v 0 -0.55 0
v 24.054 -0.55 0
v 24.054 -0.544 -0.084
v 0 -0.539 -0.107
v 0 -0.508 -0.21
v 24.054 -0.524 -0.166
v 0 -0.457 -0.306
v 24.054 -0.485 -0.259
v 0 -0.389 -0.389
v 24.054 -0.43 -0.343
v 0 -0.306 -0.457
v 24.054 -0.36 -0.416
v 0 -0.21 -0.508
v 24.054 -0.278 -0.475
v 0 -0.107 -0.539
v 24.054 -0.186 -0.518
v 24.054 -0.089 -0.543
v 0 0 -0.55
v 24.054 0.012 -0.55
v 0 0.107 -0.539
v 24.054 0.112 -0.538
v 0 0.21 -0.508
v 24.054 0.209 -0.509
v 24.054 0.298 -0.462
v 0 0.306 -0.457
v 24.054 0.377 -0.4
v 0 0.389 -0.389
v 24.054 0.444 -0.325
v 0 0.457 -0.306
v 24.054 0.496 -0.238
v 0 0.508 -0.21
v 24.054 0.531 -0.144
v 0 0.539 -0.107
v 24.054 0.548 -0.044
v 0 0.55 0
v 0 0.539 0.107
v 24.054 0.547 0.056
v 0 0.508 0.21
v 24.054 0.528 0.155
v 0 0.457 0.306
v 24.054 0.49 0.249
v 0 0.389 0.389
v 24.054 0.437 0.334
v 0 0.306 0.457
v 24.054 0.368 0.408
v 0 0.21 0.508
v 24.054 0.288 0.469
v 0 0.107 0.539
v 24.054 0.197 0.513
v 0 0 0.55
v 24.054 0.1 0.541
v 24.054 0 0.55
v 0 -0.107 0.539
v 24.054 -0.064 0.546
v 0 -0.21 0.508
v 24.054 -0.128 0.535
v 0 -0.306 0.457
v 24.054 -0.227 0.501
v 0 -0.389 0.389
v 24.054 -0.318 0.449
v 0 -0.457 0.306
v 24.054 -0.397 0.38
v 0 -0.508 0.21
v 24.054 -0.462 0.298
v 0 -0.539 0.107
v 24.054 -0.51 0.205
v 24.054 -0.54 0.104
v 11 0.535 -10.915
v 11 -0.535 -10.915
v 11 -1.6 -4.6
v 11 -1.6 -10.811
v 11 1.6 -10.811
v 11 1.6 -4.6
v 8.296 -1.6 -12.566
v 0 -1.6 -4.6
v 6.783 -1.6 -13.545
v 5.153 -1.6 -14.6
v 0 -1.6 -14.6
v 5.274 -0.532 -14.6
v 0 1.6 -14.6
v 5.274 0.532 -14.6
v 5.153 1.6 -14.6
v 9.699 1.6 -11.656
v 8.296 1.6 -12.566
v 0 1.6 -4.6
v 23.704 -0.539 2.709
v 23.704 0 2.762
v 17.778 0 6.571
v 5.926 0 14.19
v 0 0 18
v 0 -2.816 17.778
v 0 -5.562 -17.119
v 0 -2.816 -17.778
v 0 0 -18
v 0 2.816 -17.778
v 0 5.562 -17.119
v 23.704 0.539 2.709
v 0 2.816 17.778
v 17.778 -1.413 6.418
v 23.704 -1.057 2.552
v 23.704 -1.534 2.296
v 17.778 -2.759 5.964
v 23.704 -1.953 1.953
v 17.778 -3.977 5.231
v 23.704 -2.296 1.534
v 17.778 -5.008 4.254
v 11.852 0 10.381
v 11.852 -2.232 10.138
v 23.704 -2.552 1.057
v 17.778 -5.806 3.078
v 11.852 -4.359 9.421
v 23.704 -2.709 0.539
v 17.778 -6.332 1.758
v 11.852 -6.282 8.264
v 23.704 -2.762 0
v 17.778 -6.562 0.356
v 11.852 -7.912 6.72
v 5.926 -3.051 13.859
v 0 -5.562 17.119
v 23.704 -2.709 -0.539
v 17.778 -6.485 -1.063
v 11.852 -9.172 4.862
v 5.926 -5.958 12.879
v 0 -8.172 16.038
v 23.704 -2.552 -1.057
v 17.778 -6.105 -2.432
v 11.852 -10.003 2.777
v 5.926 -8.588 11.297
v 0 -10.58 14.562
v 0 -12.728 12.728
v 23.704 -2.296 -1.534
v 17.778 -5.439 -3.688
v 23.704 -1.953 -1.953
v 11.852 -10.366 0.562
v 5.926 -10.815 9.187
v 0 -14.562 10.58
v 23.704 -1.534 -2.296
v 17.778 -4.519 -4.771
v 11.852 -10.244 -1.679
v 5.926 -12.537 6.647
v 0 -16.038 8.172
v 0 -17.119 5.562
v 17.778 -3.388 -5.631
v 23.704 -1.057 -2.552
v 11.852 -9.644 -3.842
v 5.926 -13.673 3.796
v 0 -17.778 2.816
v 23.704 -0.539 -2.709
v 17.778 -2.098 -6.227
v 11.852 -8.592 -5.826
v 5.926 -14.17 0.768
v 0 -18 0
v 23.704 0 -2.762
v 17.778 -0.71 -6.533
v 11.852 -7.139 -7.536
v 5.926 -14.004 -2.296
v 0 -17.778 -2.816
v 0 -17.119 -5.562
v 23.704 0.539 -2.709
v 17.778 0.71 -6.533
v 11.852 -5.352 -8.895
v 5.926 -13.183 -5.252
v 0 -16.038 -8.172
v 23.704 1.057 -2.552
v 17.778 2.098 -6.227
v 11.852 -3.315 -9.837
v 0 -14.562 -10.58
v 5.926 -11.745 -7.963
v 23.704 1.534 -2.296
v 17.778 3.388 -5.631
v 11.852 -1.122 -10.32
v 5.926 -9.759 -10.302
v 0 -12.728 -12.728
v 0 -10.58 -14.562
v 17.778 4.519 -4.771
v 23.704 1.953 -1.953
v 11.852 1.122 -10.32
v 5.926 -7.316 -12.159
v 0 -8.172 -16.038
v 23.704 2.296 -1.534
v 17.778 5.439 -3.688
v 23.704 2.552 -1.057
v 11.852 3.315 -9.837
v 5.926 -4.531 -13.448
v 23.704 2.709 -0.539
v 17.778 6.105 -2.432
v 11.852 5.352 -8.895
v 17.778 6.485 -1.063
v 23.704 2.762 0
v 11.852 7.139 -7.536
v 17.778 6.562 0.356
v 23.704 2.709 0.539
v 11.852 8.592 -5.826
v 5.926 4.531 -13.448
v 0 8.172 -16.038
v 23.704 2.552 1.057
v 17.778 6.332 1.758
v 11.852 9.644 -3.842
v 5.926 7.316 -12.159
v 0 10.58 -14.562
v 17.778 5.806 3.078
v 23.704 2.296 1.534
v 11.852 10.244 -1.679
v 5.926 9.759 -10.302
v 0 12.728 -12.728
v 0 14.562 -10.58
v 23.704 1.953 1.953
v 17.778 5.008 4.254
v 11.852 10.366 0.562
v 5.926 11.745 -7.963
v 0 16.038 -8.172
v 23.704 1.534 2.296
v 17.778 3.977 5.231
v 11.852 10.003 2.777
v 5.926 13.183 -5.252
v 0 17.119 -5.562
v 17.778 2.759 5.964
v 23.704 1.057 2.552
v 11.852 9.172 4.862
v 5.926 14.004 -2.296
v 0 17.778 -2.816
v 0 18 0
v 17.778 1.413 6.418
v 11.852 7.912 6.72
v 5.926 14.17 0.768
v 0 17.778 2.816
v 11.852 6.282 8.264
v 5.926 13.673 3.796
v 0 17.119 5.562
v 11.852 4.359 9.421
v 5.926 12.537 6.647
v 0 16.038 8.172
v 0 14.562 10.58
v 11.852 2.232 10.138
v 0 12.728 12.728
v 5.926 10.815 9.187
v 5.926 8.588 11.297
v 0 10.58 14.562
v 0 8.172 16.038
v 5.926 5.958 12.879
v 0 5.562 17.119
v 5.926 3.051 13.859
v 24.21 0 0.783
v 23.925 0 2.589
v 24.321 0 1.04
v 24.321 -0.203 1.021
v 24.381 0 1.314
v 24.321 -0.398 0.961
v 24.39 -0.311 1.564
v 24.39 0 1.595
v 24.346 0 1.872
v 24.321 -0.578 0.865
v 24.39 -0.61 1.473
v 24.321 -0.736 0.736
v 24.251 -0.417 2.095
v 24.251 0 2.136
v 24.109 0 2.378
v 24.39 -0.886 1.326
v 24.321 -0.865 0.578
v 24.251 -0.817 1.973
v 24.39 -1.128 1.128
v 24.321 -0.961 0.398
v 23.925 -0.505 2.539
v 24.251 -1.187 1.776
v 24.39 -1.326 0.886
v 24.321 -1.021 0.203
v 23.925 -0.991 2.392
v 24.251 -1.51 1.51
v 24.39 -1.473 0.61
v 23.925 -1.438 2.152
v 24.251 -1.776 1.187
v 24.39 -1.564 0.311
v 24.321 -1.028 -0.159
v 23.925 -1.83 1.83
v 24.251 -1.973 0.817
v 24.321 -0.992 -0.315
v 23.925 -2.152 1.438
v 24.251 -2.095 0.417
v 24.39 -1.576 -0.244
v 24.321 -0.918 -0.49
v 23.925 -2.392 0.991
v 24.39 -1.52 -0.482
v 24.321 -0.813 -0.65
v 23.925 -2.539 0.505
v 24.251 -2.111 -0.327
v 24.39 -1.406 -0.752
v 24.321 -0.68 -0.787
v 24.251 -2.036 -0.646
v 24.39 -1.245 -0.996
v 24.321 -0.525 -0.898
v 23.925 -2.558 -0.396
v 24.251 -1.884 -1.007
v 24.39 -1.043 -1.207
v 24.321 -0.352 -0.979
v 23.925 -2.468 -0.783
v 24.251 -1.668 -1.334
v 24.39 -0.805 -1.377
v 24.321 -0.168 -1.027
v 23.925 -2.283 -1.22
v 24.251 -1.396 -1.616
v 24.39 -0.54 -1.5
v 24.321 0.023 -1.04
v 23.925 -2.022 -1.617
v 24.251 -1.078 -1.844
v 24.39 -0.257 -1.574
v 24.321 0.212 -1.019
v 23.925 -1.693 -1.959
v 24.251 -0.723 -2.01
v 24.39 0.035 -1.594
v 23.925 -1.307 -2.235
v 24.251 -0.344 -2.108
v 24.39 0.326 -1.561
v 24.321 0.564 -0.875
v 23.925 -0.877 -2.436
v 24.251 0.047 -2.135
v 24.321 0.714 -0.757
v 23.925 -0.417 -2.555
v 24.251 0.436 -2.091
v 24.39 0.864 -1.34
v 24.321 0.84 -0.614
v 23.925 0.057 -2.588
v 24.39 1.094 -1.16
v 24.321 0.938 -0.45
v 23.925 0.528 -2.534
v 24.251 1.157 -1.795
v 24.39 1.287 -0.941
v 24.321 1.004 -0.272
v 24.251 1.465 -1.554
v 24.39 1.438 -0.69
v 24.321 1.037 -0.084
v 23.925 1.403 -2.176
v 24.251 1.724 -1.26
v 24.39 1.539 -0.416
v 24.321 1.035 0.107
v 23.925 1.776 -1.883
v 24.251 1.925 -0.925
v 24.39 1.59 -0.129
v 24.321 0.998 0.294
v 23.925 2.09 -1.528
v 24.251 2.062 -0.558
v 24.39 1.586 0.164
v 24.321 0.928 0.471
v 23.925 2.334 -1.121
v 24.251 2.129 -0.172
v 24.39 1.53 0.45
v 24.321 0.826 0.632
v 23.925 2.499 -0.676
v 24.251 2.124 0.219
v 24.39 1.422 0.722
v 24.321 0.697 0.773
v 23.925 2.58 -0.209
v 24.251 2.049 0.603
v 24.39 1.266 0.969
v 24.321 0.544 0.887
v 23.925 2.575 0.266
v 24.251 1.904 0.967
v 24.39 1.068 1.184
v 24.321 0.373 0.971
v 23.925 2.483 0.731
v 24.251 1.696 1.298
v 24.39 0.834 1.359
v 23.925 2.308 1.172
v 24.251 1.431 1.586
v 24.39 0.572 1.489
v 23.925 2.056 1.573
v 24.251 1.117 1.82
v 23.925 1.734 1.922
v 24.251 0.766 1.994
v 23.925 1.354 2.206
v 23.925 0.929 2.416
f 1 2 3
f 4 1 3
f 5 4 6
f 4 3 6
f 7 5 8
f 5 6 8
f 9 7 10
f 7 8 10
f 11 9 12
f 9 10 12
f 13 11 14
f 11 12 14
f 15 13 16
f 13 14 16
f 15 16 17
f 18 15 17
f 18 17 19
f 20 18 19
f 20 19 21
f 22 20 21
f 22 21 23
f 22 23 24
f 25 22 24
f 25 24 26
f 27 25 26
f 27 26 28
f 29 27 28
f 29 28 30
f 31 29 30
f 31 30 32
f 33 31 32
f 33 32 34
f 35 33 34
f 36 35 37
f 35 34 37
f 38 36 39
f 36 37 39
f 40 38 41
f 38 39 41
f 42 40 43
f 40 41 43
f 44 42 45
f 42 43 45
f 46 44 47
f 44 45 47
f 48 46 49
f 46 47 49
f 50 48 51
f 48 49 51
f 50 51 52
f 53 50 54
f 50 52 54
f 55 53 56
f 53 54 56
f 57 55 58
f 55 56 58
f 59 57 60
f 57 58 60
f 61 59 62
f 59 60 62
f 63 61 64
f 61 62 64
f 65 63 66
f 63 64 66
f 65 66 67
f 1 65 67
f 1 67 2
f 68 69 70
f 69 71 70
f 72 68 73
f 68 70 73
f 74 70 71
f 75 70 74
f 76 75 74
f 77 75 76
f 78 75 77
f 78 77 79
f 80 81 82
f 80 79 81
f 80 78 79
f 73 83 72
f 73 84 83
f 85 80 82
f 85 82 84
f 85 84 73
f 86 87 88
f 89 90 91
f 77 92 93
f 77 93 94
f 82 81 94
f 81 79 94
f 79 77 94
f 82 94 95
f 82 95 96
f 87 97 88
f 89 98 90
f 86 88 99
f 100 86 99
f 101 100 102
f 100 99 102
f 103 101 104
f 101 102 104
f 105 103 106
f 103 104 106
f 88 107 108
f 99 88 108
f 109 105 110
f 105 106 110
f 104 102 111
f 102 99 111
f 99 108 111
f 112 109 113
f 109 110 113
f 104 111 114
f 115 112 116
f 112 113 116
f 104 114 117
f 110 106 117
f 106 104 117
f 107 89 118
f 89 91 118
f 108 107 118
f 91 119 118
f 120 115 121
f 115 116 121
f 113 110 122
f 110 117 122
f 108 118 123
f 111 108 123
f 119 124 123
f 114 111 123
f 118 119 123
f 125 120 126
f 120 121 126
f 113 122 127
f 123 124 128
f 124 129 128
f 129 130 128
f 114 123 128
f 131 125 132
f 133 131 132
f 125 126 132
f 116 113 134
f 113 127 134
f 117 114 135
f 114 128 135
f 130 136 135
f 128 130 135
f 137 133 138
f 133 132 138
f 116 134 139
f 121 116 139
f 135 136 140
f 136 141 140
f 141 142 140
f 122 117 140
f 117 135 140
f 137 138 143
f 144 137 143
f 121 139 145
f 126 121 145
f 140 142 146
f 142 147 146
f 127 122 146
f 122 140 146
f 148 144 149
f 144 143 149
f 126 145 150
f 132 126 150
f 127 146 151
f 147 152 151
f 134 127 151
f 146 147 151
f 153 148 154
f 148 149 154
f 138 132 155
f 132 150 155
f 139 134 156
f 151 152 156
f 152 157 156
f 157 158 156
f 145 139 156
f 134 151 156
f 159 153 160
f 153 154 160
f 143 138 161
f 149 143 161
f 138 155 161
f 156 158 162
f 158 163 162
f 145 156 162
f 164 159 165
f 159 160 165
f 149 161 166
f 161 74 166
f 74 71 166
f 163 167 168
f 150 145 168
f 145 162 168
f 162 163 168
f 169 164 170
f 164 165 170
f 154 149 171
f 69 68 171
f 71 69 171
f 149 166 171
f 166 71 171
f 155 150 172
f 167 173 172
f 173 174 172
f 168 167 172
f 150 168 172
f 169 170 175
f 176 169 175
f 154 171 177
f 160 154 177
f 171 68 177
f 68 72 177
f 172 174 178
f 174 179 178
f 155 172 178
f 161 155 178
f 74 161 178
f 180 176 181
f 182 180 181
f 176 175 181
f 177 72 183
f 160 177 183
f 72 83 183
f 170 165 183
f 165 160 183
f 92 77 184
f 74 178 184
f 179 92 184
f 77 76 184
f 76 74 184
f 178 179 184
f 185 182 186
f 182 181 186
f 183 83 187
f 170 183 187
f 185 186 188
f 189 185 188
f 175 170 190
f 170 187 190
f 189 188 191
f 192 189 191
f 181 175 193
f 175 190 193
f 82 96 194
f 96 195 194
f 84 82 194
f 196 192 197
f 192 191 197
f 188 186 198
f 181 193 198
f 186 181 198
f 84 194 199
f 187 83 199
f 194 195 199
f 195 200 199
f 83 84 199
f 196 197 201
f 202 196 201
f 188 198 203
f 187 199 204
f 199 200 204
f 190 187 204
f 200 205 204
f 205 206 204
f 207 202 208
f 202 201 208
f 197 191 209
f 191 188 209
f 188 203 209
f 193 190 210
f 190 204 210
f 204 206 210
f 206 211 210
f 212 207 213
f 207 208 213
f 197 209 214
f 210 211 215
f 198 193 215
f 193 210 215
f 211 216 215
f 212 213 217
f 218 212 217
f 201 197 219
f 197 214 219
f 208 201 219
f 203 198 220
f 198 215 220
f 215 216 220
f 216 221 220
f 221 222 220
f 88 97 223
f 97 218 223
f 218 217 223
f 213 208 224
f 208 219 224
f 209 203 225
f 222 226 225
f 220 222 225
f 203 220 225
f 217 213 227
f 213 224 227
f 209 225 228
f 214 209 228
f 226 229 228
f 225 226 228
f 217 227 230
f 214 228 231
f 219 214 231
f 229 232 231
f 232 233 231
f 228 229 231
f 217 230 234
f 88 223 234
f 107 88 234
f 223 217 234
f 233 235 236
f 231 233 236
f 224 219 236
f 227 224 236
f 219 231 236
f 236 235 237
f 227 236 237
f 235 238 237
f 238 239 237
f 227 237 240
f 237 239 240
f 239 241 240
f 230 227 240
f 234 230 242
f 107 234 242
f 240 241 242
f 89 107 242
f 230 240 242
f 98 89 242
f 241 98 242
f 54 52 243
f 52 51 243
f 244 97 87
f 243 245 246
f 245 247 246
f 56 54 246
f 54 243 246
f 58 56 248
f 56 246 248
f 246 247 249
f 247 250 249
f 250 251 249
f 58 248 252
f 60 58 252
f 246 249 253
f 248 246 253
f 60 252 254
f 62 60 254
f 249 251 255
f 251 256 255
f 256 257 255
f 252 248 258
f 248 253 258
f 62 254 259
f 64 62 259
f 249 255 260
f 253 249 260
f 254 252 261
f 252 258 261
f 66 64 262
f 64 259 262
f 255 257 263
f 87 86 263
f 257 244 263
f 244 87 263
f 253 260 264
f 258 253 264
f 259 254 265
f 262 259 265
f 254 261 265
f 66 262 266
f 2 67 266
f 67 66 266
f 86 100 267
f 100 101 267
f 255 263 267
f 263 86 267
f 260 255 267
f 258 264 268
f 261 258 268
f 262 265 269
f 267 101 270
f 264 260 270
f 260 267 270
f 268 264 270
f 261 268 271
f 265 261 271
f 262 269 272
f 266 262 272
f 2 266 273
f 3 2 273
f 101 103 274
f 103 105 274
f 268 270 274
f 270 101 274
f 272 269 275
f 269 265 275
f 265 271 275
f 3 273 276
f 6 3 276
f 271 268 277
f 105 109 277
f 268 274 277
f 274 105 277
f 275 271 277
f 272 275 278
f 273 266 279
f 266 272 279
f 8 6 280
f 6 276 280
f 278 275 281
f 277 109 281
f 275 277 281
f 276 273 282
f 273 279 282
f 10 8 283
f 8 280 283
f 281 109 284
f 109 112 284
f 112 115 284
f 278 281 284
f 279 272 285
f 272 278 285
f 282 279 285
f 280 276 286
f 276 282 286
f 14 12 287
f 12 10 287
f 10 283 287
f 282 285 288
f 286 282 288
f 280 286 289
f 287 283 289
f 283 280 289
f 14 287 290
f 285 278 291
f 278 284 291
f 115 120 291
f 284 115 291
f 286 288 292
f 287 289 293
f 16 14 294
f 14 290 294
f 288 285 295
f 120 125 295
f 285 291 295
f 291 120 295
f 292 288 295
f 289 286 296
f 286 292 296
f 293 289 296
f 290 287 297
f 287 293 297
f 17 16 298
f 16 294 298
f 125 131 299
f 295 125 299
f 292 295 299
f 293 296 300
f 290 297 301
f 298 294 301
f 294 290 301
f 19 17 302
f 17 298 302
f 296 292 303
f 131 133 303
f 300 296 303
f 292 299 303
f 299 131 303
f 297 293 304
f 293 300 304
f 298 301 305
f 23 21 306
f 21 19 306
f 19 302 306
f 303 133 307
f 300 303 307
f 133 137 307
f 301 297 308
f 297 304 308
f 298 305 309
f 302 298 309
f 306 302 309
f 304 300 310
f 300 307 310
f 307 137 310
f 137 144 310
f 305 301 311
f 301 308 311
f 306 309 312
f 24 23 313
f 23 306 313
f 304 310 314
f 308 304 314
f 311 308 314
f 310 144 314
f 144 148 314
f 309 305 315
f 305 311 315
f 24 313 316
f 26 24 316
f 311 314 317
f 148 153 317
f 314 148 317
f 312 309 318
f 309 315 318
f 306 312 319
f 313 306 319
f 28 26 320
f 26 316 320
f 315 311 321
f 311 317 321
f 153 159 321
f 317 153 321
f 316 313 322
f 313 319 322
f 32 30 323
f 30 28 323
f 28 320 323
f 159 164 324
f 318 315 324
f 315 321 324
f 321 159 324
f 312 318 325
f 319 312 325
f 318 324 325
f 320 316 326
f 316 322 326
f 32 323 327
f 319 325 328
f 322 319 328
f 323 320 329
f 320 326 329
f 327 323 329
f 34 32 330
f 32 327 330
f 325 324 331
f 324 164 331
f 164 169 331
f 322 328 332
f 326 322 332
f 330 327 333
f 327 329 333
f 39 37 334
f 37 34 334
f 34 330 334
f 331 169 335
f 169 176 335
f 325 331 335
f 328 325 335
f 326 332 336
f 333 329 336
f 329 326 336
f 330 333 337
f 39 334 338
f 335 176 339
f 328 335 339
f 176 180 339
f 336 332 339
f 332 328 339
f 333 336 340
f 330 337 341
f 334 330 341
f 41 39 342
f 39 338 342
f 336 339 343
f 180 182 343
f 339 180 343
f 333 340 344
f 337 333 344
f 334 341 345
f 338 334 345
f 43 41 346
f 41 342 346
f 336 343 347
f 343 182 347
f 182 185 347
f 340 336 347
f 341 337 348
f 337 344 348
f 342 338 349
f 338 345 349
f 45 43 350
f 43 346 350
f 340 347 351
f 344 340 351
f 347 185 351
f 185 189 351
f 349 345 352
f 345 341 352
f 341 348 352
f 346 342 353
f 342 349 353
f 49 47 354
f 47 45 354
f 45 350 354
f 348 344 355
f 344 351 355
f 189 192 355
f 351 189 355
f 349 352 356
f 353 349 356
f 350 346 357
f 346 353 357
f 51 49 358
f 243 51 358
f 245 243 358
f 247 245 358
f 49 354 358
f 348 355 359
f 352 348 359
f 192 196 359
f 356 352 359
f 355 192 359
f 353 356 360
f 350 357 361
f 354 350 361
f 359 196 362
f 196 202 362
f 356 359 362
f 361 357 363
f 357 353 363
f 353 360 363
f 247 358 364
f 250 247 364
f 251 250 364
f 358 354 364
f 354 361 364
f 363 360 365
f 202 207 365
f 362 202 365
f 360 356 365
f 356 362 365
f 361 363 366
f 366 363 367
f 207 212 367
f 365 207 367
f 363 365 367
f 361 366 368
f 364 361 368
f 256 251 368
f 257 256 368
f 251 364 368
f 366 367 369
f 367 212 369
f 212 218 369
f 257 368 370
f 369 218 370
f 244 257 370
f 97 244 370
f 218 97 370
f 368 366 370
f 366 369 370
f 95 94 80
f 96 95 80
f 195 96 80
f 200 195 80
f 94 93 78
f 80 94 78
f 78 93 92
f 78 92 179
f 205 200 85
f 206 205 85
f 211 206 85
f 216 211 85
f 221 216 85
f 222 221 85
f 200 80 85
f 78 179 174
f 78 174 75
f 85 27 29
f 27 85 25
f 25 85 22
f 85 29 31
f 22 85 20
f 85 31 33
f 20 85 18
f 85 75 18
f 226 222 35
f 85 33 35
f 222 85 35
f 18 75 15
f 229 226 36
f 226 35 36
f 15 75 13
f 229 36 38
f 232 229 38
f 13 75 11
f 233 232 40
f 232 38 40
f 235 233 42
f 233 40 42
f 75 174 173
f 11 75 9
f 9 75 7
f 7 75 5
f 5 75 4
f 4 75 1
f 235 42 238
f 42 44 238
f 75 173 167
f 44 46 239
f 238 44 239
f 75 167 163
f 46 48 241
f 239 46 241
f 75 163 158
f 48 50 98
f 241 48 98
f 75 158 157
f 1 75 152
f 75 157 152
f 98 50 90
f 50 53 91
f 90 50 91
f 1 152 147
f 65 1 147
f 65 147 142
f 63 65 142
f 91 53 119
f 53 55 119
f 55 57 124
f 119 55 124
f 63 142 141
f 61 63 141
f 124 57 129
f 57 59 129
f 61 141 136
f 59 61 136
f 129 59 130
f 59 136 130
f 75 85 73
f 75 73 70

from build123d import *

# Parameters (mm, degrees)
F3_D     = 1.1
F5_DEPTH = 11


with BuildPart() as f1:
    # F0 (on Front) → F1 (revolve)
    with BuildSketch(Plane.XZ):
        with BuildLine():
            Line((0, 18), (0, 0))
            Line((0, 0), (22.892781, 0))
            ThreePointArc((22.892781, 0), (24.331991, 1.077301), (23.703917, 2.761768))
            Line((23.703917, 2.761768), (0, 18))
        make_face()
    revolve(axis=Axis((11.44639, 0, 0), (1, 0, 0)))

    # F3 (through all)
    with Locations(Plane(origin=(0, 0, 0), x_dir=(0, 1, 0), z_dir=(-1, 0, 0))):
        with Locations((0, 0)):
            Hole(F3_D / 2)

    # F4 (on Right) → F5 (cut)
    with BuildSketch(Plane.YZ):
        Polygon((-1.6, -8.85), (-1.6, -14.6), (1.6, -14.6), (1.6, -8.85), (1.6, -4.6), (-1.6, -4.6), align=None)
    extrude(amount=F5_DEPTH, mode=Mode.SUBTRACT)


solid = f1.part
